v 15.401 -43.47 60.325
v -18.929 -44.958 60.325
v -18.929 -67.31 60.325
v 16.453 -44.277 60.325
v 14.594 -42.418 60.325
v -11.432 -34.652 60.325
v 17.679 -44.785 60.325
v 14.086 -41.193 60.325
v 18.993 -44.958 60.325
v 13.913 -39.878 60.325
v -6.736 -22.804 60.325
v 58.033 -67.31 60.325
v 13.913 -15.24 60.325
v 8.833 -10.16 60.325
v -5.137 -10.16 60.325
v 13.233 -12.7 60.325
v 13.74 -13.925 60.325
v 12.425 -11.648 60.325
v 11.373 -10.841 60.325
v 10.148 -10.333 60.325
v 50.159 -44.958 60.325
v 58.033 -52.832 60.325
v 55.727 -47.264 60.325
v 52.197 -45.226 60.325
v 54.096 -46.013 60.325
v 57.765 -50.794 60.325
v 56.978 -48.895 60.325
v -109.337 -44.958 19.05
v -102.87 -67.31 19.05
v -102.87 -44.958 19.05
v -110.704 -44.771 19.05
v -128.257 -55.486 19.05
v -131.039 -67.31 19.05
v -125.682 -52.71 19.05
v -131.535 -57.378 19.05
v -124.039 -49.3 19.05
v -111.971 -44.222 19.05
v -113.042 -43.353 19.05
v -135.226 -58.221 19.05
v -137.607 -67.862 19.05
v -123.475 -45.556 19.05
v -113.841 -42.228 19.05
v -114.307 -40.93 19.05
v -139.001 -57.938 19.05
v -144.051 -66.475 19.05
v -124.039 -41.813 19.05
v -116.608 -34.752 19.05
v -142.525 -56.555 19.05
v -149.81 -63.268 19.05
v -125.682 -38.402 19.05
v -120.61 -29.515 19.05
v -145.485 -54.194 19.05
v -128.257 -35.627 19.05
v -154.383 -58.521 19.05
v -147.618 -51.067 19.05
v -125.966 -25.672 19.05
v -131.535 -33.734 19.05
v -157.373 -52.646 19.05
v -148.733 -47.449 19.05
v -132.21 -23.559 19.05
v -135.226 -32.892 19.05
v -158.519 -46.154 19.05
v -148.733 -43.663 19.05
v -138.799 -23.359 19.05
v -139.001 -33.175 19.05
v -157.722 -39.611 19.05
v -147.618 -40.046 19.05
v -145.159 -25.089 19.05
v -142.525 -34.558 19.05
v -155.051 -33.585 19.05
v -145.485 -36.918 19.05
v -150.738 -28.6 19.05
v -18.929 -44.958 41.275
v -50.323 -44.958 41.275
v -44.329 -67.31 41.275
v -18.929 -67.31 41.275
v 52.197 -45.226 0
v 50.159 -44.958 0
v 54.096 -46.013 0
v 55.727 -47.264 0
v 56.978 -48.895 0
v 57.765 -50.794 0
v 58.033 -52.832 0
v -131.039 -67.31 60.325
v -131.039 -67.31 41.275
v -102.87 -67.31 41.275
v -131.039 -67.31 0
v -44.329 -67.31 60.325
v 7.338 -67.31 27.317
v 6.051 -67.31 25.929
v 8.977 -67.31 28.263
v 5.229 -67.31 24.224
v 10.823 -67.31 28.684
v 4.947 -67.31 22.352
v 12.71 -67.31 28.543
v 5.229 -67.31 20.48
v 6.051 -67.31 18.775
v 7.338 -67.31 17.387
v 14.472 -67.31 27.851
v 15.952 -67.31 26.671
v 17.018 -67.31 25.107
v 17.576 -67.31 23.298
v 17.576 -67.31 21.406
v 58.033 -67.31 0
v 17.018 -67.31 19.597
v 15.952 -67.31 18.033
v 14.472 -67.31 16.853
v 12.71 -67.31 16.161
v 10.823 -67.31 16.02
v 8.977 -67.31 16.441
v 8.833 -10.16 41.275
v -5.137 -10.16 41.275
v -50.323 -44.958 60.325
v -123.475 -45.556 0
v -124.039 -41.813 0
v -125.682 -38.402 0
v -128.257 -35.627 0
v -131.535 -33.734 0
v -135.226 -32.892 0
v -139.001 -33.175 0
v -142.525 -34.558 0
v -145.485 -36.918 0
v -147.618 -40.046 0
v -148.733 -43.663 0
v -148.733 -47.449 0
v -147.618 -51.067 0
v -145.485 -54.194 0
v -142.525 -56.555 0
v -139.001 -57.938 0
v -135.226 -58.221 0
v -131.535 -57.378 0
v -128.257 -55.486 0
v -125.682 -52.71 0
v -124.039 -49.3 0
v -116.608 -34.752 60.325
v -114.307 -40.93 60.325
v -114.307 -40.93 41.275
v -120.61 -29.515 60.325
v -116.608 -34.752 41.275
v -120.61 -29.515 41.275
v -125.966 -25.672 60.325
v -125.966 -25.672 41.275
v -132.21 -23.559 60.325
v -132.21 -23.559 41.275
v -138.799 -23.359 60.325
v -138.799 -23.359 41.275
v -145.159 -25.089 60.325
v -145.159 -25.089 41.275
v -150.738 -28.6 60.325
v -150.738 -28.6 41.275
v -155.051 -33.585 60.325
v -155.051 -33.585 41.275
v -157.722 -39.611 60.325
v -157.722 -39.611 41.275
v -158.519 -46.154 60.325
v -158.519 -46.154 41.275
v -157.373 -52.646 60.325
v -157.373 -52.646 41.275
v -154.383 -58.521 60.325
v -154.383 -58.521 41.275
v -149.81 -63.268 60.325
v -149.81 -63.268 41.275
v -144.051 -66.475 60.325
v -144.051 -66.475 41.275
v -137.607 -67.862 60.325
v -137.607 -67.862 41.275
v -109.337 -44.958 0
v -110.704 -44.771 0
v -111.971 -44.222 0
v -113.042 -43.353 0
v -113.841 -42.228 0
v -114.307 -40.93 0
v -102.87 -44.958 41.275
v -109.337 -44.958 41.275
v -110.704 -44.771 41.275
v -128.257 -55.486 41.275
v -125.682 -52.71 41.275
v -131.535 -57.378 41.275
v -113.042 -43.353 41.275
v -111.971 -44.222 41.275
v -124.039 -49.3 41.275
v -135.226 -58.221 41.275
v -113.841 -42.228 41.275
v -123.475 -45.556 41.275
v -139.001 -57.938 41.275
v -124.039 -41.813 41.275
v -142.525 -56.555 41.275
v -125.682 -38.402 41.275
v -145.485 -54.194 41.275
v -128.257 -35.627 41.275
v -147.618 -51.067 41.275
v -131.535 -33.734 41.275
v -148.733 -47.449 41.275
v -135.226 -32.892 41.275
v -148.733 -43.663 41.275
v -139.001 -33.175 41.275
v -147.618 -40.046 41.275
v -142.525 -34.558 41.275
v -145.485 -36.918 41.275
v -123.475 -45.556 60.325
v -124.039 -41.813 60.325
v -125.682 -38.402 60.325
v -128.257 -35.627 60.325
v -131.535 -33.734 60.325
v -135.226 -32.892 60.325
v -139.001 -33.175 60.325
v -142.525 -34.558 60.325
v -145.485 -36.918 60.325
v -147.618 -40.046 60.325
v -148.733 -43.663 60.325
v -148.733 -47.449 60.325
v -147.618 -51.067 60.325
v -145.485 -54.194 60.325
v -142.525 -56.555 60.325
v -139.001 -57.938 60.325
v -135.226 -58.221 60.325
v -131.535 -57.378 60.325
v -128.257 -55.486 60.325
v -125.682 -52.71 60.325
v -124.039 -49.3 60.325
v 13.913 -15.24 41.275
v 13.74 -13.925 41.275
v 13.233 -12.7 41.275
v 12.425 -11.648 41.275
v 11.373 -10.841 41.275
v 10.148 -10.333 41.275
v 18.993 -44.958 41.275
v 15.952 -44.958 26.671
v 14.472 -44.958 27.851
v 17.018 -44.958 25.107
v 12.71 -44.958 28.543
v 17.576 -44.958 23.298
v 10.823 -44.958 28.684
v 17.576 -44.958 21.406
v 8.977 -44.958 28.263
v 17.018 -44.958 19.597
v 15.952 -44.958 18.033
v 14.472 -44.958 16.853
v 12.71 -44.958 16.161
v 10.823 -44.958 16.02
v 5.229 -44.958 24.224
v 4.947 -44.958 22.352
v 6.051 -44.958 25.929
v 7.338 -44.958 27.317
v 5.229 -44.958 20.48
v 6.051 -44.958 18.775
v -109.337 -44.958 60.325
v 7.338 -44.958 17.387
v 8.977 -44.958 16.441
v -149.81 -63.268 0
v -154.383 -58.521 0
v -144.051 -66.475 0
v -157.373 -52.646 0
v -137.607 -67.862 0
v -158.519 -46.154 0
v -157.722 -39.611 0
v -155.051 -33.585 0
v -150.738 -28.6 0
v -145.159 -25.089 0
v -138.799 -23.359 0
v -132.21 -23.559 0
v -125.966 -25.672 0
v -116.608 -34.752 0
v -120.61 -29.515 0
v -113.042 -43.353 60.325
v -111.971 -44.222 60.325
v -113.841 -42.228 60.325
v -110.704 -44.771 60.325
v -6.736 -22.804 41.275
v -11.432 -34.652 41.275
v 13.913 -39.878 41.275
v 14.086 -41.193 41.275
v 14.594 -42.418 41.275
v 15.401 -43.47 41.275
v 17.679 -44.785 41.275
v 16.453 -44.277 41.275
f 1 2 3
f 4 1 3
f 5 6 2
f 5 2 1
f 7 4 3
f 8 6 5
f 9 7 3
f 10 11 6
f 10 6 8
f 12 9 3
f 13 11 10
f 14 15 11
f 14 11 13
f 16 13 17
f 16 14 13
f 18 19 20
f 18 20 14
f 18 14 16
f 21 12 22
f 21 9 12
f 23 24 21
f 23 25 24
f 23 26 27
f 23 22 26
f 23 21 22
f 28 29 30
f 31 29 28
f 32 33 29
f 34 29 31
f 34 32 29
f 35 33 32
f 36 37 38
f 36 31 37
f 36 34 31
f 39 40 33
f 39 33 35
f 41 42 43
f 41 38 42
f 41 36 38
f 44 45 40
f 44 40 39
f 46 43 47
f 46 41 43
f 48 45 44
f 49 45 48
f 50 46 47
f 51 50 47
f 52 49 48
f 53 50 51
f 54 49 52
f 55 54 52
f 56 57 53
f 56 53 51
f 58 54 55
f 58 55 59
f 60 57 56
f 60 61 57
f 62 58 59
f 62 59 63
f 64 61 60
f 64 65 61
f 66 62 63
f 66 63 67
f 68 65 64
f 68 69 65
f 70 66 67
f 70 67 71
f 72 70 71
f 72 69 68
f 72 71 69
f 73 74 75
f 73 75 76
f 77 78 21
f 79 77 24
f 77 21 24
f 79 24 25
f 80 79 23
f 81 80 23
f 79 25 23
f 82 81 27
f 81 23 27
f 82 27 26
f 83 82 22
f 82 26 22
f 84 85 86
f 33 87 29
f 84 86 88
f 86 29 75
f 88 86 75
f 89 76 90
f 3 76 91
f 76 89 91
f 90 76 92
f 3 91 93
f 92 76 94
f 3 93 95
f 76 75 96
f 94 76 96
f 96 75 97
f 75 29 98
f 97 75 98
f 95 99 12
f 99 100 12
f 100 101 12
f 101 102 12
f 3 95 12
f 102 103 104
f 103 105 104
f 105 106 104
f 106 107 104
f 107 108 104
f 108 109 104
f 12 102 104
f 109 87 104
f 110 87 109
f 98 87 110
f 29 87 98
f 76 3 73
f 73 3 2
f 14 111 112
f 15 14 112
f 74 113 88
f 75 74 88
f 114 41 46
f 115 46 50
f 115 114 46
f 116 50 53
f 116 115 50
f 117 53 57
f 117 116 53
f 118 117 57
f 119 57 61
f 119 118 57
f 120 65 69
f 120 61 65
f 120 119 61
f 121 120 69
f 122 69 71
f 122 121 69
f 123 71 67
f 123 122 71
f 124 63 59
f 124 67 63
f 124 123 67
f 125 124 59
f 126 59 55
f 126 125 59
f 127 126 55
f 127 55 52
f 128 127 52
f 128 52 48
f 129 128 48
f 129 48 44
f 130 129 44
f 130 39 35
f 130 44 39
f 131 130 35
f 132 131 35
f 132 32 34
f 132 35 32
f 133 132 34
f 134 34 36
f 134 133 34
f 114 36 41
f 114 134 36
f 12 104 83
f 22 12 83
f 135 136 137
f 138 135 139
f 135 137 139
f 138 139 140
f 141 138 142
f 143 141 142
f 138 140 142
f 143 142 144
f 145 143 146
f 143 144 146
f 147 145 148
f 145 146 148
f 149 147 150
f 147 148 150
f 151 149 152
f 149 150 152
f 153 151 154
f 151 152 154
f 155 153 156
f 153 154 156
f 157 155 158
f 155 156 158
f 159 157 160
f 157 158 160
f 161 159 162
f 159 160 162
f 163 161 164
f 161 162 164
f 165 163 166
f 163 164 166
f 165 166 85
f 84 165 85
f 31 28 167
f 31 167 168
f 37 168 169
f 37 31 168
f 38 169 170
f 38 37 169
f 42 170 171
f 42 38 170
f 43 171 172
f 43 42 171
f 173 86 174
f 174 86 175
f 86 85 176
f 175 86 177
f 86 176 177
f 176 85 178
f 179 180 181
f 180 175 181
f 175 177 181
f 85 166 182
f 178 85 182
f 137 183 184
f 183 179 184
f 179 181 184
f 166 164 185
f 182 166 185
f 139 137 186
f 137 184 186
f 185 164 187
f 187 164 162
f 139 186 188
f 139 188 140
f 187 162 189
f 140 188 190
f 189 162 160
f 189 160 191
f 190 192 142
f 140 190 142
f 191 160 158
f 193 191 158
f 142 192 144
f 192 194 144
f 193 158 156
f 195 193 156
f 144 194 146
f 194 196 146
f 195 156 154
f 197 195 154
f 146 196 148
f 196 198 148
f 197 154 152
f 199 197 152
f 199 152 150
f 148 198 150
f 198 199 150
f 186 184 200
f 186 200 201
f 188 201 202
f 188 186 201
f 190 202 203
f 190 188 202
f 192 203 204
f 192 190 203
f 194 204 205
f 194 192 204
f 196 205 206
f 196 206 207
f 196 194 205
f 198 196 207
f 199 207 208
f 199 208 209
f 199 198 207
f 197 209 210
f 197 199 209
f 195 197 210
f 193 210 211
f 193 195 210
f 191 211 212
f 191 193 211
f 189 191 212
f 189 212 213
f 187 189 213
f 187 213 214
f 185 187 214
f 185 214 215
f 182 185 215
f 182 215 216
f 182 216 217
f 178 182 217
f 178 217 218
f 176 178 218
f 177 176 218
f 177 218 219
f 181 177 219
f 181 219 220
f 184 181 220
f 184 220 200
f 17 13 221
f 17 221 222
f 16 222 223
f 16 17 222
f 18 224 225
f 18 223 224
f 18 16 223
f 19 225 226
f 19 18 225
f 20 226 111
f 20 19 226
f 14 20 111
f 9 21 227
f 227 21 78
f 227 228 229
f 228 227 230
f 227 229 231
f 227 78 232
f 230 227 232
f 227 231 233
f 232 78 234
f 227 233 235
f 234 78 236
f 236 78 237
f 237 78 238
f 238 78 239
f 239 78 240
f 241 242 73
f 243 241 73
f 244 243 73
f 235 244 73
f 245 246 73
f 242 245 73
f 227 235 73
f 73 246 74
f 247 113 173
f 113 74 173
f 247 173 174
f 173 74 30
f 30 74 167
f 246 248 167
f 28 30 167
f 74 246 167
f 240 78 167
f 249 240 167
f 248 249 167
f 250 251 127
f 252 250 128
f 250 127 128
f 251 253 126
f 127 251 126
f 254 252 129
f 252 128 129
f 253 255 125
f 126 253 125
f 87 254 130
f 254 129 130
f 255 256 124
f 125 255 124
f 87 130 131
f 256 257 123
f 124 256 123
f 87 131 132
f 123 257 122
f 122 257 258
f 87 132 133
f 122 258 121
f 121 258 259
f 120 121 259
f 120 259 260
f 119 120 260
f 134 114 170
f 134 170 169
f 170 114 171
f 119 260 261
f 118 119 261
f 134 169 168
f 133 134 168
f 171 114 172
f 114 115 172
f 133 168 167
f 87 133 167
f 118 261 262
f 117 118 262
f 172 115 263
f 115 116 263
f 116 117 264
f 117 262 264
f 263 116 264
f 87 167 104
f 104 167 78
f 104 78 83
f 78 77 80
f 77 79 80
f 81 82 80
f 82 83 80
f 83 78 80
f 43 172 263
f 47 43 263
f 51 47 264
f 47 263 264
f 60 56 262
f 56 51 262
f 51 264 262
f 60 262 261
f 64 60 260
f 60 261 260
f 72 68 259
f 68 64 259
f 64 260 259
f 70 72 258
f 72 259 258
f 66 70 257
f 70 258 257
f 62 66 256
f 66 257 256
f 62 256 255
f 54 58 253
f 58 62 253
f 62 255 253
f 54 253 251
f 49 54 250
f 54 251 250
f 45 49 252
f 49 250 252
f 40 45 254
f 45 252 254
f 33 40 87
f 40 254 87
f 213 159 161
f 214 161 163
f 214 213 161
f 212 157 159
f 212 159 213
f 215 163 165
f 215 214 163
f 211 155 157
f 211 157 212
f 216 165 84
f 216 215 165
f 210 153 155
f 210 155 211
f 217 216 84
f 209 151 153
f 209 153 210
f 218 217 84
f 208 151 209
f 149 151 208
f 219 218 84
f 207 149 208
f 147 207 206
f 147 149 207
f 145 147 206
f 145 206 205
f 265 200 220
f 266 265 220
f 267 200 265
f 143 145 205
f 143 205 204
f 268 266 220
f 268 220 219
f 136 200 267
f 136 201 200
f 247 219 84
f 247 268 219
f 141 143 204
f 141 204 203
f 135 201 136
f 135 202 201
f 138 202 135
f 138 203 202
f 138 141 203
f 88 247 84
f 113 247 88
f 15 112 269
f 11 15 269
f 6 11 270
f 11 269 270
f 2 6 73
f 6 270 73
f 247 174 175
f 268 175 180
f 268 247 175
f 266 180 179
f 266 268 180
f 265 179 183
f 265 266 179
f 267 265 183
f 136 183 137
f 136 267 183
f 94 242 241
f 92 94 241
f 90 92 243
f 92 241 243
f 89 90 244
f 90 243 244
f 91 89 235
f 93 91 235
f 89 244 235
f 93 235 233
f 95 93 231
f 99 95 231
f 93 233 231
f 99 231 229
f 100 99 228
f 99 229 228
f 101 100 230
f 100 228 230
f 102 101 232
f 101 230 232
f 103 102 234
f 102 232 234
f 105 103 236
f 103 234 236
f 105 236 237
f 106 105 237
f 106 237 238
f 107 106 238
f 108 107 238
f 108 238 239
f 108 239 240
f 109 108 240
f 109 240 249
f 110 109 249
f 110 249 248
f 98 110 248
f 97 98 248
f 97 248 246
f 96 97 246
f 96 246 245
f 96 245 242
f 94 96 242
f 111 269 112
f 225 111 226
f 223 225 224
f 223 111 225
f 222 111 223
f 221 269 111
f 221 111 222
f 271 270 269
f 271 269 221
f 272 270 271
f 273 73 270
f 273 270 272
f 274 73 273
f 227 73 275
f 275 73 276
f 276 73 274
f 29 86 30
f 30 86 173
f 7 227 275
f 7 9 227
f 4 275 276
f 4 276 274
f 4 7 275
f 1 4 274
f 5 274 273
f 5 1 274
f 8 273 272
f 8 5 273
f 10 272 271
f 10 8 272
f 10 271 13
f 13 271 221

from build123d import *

# Parameters (mm, degrees)
F0_R      = 12.7
F1_DEPTH  = 60.325
F2_R      = 5.08
F3_R      = 7.874
F5_DEPTH  = 19.05
F7_DEPTH  = 41.275
F8_R      = 6.35
F9_DEPTH  = 22.951227039
F10_R     = 5.08
F11_R     = 5.08
F13_W     = 63.8135012672
F13_H     = 22.225
F14_DEPTH = 57.15


with BuildPart() as f1:
    # F0 (on Top) → F1 (new body)
    with BuildSketch(Plane.XY):
        with BuildLine():
            ThreePointArc((-113.8312659101, -44.9580233222), (-153.8868240783, -31.9212818085), (-131.0386, -67.3100233222))
            Line((-131.0386, -67.3100233222), (-44.3288590271, -67.3100233222))
            Line((-44.3288590271, -67.3100233222), (-50.3232590271, -44.9580233222))
            Line((-50.3232590271, -44.9580233222), (-113.8312659101, -44.9580233222))
        make_face()
        with Locations((-136.1752590271, -45.5562503612)):
            Circle(F0_R, mode=Mode.SUBTRACT)
        Polygon((-50.3232590271, -44.9580233222), (-44.3288590271, -67.3100233222), (-18.9288590271, -67.3100233222), (-18.9288590271, -44.9580233222), align=None)
        Polygon((-18.9288590271, -44.9580233222), (-18.9288590271, -67.3100233222), (58.0331409729, -67.3100233222), (58.0331409729, -44.9580233222), (13.9133409729, -44.9580233222), align=None)
        with BuildLine():
            ThreePointArc((-5.1366590271, -10.1600233222), (-8.7108436655, -28.8756656882), (-18.9288590271, -44.9580233222))
            Line((-18.9288590271, -44.9580233222), (13.9133409729, -44.9580233222))
            Line((13.9133409729, -44.9580233222), (13.9133409729, -10.1600233222))
            Line((13.9133409729, -10.1600233222), (-5.1366590271, -10.1600233222))
        make_face()
    extrude(amount=F1_DEPTH)

    # F2
    f2_edges = [f1.edges().sort_by_distance(p)[0] for p in [
        (13.913341, -10.160023, 30.1625),
    ]]
    fillet(f2_edges, radius=F2_R)

    # F3
    f3_edges = [f1.edges().sort_by_distance(p)[0] for p in [
        (58.033141, -44.958023, 30.1625),
    ]]
    fillet(f3_edges, radius=F3_R)

    # F4 (on face) → F5 (cut)
    with BuildSketch(Plane.XY.offset(60.325)):
        Polygon((-18.9288590271, -67.3100233222), (-18.9288590271, -44.9580233222), (-50.3232590271, -44.9580233222), (-44.3288590271, -67.3100233222), align=None)
    extrude(amount=-F5_DEPTH, mode=Mode.SUBTRACT)

    # F6 (on face) → F7 (cut)
    with BuildSketch(Plane(origin=(0, 0, 0), x_dir=(1, 0, 0), z_dir=(0, 0, -1))):
        with BuildLine():
            Line((13.9133409729, 15.2400233222), (13.9133409729, 44.9580233222))
            Line((13.9133409729, 44.9580233222), (-18.9288590271, 44.9580233222))
            ThreePointArc((-18.9288590271, 44.9580233222), (-8.7108436655, 28.8756656882), (-5.1366590271, 10.1600233222))
            Line((-5.1366590271, 10.1600233222), (8.8333409729, 10.1600233222))
            ThreePointArc((8.8333409729, 10.1600233222), (12.4254434213, 11.6479208738), (13.9133409729, 15.2400233222))
        make_face()
    extrude(amount=-F7_DEPTH, mode=Mode.SUBTRACT)

    # F8 (on face) → F9 (cut, through all)
    with BuildSketch(Plane(origin=(0, -44.9580233222, 0), x_dir=(-1, 0, 0), z_dir=(0, 1, 0))):
        with Locations((-11.2971409729, 22.352)):
            Circle(F8_R)
    extrude(amount=-F9_DEPTH, mode=Mode.SUBTRACT)

    # F10
    f10_edges = [f1.edges().sort_by_distance(p)[0] for p in [
        (13.913341, -44.958023, 50.8),
    ]]
    fillet(f10_edges, radius=F10_R)

    # F11
    f11_edges = [f1.edges().sort_by_distance(p)[0] for p in [
        (-113.831266, -44.958023, 30.1625),
    ]]
    fillet(f11_edges, radius=F11_R)

    # F13 (on offset) → F14 (cut)
    with BuildSketch(Plane.YZ.offset(-160.02)):
        with Locations((-45.4811556265, 30.1625)):
            Rectangle(F13_W, F13_H)
    extrude(amount=F14_DEPTH, mode=Mode.SUBTRACT)


solid = f1.part
